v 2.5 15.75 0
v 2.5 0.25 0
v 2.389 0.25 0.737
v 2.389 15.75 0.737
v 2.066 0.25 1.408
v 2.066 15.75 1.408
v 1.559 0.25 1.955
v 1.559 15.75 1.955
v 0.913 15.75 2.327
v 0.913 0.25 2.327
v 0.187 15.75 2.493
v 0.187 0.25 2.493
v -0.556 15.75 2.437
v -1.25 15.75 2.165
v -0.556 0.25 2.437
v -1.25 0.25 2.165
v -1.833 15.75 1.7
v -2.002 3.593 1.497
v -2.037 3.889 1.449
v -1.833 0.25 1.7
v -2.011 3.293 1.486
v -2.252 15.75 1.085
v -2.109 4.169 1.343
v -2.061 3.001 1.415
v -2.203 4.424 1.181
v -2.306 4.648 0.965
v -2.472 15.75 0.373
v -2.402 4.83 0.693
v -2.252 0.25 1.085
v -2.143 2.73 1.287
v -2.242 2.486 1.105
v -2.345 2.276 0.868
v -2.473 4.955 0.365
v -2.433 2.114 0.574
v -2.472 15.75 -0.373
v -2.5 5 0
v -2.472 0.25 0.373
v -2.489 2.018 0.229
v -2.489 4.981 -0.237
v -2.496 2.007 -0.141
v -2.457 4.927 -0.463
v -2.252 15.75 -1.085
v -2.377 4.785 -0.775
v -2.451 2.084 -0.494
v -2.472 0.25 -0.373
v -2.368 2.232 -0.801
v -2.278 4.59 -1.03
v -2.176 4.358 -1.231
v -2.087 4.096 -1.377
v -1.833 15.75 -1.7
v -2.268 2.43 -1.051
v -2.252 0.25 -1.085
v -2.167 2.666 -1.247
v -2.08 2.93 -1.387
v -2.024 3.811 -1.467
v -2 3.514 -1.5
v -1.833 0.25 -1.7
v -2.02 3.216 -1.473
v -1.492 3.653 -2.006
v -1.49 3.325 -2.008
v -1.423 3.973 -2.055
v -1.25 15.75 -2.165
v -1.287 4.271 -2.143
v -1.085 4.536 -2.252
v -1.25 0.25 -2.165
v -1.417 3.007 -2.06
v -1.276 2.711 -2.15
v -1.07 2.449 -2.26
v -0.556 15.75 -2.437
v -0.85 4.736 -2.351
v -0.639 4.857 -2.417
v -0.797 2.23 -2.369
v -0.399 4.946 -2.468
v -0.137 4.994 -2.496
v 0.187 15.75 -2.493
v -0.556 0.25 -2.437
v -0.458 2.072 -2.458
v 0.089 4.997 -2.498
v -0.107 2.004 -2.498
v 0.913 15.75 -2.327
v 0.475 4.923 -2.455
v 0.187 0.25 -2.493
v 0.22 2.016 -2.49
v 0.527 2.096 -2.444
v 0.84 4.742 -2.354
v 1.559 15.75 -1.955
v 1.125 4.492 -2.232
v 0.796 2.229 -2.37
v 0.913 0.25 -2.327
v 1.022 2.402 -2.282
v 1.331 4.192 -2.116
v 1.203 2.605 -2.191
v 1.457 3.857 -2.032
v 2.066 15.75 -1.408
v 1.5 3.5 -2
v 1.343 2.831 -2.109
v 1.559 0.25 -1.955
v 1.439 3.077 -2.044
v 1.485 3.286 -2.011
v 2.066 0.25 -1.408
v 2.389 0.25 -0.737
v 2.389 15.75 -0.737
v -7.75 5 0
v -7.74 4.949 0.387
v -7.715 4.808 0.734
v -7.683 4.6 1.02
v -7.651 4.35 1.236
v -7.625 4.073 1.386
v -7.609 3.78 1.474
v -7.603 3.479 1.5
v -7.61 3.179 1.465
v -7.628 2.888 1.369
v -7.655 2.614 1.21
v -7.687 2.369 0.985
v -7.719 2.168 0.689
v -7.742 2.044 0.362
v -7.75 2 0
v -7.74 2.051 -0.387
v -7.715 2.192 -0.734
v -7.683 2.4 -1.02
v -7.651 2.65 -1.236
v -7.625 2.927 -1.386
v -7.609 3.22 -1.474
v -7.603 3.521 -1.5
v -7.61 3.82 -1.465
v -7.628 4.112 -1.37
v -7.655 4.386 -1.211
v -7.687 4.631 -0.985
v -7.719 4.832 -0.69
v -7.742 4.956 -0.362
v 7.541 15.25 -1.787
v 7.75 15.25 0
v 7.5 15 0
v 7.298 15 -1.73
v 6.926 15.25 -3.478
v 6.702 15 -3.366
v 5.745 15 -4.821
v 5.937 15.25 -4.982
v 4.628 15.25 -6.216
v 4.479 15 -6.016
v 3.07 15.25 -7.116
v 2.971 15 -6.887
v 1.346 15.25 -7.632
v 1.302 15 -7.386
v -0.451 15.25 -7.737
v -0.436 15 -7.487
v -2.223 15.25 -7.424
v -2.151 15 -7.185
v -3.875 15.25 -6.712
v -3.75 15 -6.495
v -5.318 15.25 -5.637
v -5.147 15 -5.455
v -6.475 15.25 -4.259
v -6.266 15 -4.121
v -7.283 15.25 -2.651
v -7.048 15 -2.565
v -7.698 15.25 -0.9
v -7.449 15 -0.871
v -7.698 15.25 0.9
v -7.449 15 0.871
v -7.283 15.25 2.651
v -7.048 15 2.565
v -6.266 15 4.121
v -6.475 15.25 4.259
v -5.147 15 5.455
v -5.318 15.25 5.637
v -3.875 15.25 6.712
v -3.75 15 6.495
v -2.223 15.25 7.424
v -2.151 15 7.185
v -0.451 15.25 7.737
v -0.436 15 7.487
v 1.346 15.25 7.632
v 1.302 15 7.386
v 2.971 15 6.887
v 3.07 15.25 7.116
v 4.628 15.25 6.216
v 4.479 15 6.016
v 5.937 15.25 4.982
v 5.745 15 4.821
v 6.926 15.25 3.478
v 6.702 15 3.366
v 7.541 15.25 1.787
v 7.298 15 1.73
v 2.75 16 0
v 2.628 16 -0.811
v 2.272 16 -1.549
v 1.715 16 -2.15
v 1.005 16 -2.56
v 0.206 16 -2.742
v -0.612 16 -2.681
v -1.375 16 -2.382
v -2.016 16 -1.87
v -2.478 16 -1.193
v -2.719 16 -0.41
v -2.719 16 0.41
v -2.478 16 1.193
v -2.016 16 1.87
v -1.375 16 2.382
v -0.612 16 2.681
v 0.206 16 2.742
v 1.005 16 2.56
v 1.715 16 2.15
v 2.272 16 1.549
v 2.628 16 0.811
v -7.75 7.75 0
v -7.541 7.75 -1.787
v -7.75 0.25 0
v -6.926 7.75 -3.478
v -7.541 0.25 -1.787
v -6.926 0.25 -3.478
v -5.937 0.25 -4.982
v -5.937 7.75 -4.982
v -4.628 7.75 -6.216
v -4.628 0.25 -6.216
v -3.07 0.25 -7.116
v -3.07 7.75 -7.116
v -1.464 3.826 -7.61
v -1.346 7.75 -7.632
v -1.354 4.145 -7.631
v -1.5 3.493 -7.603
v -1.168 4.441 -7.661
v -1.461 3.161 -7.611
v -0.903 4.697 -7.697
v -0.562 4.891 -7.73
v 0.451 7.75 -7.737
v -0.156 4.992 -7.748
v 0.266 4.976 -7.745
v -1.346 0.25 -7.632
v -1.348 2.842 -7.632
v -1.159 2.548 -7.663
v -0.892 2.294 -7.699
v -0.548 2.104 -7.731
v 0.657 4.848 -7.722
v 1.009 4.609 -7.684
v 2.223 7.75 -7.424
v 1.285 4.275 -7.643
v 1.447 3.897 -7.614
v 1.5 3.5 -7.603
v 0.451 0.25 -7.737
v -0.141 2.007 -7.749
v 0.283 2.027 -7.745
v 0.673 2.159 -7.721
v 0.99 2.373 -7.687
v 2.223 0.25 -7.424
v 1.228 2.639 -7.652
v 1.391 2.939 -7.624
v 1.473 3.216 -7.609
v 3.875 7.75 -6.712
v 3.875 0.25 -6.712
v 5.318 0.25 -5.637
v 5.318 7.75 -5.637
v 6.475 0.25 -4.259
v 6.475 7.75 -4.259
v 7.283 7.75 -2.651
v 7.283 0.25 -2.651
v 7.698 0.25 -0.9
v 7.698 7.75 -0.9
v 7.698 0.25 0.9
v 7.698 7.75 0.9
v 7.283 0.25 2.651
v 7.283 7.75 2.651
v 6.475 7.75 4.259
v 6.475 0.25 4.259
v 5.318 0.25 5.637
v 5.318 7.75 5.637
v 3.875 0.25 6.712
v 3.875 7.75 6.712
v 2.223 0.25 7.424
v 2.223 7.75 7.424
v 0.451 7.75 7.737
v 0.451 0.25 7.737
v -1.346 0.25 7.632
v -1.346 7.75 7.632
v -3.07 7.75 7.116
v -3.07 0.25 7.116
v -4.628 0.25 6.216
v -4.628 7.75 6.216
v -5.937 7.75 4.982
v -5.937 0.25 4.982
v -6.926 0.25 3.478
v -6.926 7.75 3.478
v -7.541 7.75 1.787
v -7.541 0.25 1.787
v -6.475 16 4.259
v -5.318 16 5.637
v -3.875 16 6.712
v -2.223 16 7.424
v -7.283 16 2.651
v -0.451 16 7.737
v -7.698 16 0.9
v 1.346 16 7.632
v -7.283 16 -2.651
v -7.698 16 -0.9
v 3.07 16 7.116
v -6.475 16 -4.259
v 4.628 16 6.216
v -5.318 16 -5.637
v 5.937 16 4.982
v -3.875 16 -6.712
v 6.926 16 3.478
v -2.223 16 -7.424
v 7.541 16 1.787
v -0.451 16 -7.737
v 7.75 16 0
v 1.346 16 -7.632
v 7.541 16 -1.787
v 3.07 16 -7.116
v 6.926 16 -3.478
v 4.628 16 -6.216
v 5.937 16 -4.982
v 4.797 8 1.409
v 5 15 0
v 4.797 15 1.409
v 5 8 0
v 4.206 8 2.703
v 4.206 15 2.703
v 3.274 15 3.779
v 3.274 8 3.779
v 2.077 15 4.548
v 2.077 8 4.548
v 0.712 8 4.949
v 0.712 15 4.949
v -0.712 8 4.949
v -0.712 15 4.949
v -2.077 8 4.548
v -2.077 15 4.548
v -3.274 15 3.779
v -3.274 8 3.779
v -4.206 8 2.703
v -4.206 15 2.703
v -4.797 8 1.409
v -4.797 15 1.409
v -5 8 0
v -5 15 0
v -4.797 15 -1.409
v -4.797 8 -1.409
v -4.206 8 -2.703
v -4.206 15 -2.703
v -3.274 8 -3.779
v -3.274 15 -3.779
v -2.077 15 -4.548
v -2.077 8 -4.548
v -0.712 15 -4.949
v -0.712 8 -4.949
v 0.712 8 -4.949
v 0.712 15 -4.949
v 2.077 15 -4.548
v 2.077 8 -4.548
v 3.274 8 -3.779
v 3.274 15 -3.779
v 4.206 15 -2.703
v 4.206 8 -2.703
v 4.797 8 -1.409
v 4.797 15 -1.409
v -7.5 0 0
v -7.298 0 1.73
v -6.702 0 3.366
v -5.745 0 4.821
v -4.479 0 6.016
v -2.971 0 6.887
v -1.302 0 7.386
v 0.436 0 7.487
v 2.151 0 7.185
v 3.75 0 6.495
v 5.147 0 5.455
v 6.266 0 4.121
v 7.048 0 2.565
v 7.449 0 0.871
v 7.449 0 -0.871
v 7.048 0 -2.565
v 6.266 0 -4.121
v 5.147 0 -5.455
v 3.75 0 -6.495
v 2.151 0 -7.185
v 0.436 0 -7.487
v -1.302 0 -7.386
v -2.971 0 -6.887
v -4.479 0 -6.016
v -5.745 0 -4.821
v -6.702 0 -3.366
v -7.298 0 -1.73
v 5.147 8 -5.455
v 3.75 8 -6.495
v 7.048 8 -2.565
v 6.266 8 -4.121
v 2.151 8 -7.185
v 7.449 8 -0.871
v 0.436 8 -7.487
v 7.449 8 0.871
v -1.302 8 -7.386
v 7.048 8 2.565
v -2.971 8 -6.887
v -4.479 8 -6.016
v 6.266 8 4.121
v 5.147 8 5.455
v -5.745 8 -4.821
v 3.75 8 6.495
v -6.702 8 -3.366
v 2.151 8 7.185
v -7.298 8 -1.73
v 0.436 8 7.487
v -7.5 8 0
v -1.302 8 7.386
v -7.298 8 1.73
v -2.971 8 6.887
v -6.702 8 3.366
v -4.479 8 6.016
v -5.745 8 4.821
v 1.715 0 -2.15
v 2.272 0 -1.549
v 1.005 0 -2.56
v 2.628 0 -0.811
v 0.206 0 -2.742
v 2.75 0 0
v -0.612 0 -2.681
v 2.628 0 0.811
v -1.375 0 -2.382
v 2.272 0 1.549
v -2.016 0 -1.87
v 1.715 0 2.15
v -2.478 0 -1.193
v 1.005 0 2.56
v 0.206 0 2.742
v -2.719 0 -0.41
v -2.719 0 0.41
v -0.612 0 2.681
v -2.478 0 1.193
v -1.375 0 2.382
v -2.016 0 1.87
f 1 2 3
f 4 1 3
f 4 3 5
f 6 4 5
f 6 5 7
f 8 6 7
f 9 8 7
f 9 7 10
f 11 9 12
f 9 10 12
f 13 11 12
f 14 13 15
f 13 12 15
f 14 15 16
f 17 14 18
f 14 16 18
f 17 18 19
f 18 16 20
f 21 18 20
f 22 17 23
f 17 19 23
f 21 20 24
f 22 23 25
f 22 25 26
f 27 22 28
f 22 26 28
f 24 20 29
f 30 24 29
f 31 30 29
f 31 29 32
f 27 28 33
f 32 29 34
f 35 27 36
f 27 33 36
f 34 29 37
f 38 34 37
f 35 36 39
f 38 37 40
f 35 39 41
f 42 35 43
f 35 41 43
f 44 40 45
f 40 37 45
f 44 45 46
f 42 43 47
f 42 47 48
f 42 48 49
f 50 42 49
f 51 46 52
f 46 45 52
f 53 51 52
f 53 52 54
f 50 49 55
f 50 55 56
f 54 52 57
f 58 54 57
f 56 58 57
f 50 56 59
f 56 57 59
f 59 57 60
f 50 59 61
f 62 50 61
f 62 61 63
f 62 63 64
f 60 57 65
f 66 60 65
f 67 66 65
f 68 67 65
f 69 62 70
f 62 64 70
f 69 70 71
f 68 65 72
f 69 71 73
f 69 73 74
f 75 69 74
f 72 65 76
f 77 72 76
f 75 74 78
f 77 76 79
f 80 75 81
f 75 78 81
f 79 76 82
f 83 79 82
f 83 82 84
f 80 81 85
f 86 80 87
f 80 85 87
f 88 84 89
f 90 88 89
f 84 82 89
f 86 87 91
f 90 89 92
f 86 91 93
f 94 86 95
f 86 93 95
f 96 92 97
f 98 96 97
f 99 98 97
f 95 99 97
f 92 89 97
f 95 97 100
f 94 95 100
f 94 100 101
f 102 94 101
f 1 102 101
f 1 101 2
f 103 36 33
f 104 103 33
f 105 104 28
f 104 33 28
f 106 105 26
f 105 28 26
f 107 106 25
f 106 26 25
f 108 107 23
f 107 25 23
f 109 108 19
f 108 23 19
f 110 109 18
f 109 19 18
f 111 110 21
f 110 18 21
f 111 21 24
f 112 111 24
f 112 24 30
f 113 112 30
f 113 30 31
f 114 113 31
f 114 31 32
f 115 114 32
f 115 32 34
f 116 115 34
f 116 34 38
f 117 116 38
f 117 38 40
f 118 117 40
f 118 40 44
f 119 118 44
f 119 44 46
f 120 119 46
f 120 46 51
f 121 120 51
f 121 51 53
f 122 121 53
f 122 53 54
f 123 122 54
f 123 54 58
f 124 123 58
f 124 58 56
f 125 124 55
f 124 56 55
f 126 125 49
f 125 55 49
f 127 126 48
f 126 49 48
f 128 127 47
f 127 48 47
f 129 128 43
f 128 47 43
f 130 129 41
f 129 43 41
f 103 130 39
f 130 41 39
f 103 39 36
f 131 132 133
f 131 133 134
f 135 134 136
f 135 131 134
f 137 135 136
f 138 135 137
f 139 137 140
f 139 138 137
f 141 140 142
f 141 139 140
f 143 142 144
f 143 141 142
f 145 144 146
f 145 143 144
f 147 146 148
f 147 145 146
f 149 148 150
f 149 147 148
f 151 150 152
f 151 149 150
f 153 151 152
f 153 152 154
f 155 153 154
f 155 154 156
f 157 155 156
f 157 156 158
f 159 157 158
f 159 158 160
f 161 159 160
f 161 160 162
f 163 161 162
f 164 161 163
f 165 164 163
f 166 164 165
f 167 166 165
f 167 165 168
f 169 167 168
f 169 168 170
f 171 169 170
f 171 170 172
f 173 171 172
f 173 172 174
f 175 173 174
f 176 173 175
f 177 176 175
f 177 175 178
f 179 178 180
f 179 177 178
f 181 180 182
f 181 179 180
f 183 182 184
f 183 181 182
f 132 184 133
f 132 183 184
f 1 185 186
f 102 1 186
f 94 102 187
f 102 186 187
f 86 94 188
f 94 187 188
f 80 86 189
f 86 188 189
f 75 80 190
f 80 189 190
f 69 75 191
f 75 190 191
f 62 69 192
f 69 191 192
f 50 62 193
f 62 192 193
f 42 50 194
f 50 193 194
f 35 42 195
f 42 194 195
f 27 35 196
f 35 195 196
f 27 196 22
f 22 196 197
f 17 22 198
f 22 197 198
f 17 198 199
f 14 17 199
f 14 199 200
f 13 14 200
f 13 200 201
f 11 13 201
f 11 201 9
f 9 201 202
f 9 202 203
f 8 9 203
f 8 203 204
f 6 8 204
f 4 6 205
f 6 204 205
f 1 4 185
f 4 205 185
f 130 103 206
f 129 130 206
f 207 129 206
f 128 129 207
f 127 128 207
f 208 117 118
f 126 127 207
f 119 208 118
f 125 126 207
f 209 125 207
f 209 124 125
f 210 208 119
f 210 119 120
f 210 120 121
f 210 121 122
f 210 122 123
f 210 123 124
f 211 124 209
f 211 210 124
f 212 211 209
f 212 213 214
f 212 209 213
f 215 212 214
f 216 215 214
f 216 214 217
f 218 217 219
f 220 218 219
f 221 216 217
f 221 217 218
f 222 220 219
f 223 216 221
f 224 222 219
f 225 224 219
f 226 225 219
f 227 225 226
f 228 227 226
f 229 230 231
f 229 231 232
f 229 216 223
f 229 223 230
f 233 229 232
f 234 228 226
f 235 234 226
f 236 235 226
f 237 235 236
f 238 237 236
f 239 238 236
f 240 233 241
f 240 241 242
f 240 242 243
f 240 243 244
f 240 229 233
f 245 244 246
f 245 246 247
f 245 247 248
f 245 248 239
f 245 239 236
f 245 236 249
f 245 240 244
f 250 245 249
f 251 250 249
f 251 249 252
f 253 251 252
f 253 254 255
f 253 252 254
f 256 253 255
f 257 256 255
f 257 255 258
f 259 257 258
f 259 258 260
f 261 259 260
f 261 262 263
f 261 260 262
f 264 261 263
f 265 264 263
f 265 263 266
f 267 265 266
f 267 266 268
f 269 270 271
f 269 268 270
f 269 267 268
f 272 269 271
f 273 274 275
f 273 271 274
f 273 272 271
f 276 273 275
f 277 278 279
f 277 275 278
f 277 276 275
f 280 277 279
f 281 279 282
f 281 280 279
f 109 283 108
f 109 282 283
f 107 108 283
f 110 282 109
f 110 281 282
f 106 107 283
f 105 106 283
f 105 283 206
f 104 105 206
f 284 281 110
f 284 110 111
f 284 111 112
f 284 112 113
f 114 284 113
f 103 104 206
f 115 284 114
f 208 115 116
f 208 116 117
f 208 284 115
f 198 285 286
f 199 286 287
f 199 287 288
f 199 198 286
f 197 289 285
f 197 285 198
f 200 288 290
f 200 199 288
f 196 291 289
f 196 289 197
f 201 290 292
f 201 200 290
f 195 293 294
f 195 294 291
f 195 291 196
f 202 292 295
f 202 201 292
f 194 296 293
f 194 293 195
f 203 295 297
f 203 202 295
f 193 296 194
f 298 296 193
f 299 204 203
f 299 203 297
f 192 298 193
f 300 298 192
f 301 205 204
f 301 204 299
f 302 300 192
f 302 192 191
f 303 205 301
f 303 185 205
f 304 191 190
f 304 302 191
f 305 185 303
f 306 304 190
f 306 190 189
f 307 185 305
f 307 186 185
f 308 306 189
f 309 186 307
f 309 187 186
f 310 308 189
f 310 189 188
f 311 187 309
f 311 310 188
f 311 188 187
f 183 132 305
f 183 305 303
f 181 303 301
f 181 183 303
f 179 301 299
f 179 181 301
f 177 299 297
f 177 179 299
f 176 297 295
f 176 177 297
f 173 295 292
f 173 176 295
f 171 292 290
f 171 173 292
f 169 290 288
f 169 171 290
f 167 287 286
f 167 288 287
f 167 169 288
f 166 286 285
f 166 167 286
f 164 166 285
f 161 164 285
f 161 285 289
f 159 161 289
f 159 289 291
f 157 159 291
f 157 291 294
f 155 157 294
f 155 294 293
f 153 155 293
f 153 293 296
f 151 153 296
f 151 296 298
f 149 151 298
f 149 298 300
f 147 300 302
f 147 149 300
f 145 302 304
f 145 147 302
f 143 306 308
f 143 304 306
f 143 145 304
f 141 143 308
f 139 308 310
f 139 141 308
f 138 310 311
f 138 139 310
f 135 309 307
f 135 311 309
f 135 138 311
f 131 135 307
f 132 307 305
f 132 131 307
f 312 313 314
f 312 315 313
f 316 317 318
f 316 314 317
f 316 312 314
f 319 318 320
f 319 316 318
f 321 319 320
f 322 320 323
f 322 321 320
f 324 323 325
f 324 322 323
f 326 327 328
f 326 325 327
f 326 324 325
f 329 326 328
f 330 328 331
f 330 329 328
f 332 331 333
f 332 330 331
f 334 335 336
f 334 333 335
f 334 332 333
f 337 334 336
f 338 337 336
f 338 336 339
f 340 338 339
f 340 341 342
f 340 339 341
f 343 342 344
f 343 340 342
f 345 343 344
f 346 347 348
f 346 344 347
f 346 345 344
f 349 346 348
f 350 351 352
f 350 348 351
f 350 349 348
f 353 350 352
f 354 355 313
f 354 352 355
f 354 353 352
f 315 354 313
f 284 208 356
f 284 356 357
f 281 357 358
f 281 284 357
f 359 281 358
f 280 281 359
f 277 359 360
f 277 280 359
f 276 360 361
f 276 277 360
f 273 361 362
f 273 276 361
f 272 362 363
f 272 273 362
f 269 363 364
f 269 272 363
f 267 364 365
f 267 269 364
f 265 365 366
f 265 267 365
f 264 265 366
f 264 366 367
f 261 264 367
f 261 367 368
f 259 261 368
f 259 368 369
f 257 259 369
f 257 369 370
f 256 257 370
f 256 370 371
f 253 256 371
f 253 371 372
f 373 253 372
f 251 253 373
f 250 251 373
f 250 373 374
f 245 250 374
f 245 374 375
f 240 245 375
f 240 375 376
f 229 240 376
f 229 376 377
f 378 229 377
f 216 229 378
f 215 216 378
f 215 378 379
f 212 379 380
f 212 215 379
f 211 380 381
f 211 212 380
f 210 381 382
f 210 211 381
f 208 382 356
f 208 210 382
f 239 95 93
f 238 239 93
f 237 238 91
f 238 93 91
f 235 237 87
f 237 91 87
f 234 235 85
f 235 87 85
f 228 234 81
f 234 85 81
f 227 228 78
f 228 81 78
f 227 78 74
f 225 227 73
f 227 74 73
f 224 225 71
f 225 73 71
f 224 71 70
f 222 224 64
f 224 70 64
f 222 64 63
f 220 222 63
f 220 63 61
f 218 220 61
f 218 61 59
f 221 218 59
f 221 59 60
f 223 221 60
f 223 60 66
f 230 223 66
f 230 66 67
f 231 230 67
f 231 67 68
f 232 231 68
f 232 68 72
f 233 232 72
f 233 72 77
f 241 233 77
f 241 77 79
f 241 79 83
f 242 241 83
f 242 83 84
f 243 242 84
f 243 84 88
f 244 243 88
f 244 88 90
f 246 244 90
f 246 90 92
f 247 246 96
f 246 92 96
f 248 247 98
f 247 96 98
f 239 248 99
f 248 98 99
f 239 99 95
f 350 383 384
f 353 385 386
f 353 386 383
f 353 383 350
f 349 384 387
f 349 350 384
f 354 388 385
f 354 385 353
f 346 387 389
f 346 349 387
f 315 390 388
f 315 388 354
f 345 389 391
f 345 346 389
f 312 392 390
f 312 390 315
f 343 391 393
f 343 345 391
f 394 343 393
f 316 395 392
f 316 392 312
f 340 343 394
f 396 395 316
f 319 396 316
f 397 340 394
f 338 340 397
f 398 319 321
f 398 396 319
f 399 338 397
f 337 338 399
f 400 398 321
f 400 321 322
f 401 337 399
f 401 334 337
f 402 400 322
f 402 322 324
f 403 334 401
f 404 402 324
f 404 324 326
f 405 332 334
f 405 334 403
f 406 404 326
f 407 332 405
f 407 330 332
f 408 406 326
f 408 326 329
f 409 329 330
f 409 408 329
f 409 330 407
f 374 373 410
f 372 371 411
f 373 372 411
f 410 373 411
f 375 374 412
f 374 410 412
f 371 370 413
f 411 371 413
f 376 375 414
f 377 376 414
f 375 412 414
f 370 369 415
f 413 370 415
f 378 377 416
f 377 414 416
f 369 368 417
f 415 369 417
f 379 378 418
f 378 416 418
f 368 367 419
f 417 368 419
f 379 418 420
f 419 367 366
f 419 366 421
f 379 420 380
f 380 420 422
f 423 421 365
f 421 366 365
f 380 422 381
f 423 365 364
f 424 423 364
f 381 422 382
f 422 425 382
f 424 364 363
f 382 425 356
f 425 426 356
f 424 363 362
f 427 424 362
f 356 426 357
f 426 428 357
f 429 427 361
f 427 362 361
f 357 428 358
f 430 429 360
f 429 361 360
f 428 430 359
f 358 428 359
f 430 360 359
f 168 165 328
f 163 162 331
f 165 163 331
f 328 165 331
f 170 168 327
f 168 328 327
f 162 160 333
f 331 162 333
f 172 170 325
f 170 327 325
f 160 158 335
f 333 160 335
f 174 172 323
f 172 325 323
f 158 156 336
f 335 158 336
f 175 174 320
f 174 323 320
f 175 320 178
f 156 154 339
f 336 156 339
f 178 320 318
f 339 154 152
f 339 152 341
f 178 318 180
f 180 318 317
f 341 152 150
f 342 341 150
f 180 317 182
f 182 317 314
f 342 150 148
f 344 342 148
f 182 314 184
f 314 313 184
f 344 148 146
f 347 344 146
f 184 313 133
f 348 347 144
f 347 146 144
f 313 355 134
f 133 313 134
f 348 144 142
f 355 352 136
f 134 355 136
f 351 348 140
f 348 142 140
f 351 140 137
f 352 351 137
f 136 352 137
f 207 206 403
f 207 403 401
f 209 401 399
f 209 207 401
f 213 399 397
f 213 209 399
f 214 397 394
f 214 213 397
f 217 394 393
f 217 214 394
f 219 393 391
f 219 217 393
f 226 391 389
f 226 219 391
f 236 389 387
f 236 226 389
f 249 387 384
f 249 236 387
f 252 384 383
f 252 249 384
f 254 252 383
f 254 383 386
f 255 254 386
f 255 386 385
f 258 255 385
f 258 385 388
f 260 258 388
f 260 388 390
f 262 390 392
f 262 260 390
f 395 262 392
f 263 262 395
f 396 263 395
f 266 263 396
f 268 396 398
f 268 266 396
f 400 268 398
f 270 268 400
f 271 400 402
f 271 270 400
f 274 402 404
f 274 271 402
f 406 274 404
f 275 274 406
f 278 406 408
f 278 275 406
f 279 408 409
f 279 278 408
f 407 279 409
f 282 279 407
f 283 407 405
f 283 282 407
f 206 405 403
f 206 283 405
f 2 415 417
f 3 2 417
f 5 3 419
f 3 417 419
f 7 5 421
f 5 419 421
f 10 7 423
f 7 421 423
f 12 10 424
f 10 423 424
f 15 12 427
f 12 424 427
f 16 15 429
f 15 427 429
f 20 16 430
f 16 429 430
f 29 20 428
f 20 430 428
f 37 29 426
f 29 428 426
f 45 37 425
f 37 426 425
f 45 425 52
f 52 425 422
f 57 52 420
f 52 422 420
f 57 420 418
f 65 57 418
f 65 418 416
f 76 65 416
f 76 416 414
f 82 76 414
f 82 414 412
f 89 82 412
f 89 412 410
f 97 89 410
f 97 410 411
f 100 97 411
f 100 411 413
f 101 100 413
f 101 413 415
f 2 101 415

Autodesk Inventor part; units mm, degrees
ref_plane "YZ Plane" through (0, 0, 0) normal (1, 0, 0) x (0, 1, 0)
ref_plane "XZ Plane" through (0, 0, 0) normal (0, 1, 0) x (-1, 0, 0)
ref_plane "XY Plane" through (0, 0, 0) normal (0, 0, 1) x (1, 0, 0)
sketch "Эскиз1" plane through (0, 0, 0) normal (0, 1, 0) x (-1, 0, 0)
  circle A0 centre (0, 0) radius 7.75
  dimension "d0" = 15.5
extrude "Выдавливание1" add sketch "Эскиз1" along normal blind 8
sketch "Эскиз2" plane through (0, 8, 0) normal (0, 1, 0) x (1, 0, 0)
  circle A0 centre (0, 0) radius 5
  dimension "d3" = 10
extrude "Выдавливание2" add sketch "Эскиз2" along normal blind 7
sketch "Эскиз3" plane through (0, 15, 0) normal (0, 1, 0) x (1, 0, 0)
  circle A0 centre (0, 0) radius 7.75
extrude "Выдавливание3" add sketch "Эскиз3" along normal blind 1
chamfer "Фаска1" distance 0.25 angle 45 3 edges at (-7.75, 15, 0) (7.75, 8, 0) (7.75, 0, 0)
sketch "Эскиз4" plane through (0, 0, 0) normal (0, -1, 0) x (1, 0, 0)
  circle A0 centre (0, 0) radius 2.5
  dimension "d11" = 5
extrude "Выдавливание4" cut sketch "Эскиз4" against normal through all
chamfer "Фаска2" distance 0.25 angle 45 2 edges at (-2.5, 16, 0) (-2.5, 0, 0)
sketch "Эскиз5" plane through (0, 0, 0) normal (1, 0, 0) x (0, 1, 0)
  circle A0 centre (3.5, 0) radius 1.5
  point P0 (0, 0)
  dimension "d18" = 3
extrude "Выдавливание5" cut sketch "Эскиз5" against normal through all
sketch "Эскиз6" plane through (0, 0, 0) normal (0, 0, 1) x (1, 0, 0)
  circle A0 centre (0, 3.5) radius 1.5
  point P0 (0, 0)
  dimension "d22" = 3
extrude "Выдавливание6" cut sketch "Эскиз6" against normal through all
properties part number "GT2-20t"
